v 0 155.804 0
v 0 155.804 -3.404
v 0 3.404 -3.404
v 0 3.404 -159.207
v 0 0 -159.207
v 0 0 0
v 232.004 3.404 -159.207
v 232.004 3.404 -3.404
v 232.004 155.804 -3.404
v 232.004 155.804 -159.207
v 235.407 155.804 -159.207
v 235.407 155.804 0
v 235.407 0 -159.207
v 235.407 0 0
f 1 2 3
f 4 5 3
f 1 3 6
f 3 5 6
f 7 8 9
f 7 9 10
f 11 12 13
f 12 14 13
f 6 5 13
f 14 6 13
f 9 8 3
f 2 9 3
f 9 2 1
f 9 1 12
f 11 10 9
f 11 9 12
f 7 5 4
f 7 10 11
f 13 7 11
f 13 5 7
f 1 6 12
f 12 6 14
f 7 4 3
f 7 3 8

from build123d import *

# Parameters (mm, degrees)
SKETCH1_W           = 235.4072
SKETCH1_H           = 159.2072
BOSS_EXTRUDE1_DEPTH = 3.4036
SKETCH2_W           = 3.4036
SKETCH2_H           = 155.8036
BOSS_EXTRUDE2_DEPTH = 152.4


with BuildPart() as part:
    # Sketch1 → Boss-Extrude1 (new body)
    with BuildSketch(Plane(origin=(0, 0, 0), x_dir=(1, 0, 0), z_dir=(0, 1, 0))):
        with Locations((117.7036, 79.6036)):
            Rectangle(SKETCH1_W, SKETCH1_H)
    extrude(amount=BOSS_EXTRUDE1_DEPTH)

    # Sketch2 → Boss-Extrude2 (add)
    with BuildSketch(Plane(origin=(0, 3.4036, 0), x_dir=(1, 0, 0), z_dir=(0, 1, 0))):
        Polygon((232.0036, 3.4036), (0, 3.4036), (0, 0), (235.4072, 0), (235.4072, 3.4036), align=None)
        with Locations((233.7054, 81.3054)):
            Rectangle(SKETCH2_W, SKETCH2_H)
    extrude(amount=BOSS_EXTRUDE2_DEPTH)


solid = part.part
